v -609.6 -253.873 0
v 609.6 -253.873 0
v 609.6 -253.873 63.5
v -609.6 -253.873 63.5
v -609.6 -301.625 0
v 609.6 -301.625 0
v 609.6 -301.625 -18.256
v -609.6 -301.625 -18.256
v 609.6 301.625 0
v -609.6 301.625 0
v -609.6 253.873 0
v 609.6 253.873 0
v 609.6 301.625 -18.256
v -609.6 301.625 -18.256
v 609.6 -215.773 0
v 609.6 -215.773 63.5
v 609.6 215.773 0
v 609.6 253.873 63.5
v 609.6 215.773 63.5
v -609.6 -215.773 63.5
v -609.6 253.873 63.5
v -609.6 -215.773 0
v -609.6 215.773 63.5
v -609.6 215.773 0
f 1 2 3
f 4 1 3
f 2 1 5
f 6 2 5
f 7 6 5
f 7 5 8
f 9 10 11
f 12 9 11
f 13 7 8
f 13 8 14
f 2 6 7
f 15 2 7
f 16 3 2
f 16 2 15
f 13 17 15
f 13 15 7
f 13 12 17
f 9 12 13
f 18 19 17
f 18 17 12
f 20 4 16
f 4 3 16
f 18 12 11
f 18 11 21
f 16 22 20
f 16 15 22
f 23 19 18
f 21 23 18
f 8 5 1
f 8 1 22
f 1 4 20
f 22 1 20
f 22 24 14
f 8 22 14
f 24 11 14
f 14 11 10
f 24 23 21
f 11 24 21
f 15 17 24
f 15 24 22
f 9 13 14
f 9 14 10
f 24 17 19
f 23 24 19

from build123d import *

# Parameters (mm, degrees)
F0_W     = 38.1
F0_H     = 63.5
F1_DEPTH = 609.6


with BuildPart() as f1:
    # F0 (on Right) → F1 (new body, symmetric)
    with BuildSketch(Plane.YZ):
        with Locations((-234.823, 31.75)):
            Rectangle(F0_W, F0_H)
        Polygon((-253.873, 0), (-301.625, 0), (-301.625, -18.25625), (301.625, -18.25625), (301.625, 0), (253.873, 0), (215.773, 0), (-215.773, 0), align=None)
        with Locations((234.823, 31.75)):
            Rectangle(F0_W, F0_H)
    extrude(amount=F1_DEPTH, both=True)


solid = f1.part
